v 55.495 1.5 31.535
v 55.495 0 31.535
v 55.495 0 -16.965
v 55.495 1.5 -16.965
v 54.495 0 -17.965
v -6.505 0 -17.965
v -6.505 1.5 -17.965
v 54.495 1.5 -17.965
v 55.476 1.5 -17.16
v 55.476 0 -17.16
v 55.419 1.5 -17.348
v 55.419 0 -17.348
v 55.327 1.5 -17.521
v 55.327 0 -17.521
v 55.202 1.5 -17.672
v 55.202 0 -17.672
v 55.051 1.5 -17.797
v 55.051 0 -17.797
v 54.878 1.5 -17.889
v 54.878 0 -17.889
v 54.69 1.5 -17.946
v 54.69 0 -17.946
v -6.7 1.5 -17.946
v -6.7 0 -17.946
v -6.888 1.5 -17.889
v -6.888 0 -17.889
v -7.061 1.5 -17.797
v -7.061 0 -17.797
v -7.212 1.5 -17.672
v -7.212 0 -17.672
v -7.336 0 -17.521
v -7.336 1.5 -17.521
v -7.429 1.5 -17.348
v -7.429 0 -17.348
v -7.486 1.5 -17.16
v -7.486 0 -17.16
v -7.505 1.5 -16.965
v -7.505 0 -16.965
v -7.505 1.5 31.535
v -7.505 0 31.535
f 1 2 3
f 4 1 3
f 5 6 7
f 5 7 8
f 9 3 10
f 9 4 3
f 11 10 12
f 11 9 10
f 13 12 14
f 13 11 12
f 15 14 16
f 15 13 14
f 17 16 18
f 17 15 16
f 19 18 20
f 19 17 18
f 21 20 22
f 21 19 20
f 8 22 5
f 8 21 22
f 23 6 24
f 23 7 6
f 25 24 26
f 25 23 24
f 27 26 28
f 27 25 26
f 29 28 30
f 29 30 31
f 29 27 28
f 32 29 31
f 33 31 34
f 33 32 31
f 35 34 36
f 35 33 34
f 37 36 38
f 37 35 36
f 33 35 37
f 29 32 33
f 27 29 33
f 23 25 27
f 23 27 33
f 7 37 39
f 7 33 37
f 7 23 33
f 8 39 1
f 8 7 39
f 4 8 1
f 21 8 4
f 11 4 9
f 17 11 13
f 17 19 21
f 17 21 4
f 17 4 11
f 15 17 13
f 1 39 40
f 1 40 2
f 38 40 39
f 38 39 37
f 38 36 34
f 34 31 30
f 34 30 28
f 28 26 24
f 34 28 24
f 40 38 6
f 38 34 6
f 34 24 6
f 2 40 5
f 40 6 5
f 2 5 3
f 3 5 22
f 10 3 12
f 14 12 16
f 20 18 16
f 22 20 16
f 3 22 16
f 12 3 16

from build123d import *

# Parameters (mm, degrees)
SKETCH1_W           = 63
SKETCH1_H           = 57
BOSS_EXTRUDE1_DEPTH = 1.5
FILLET1_R           = 1
FILLET2_R           = 1
FILLET3_R           = 1
SKETCH3_W           = 63.057677914
SKETCH3_H           = 7.5
CUT_EXTRUDE2_DEPTH  = 10


with BuildPart() as part:
    # Sketch1 → Boss-Extrude1 (new body)
    with BuildSketch(Plane(origin=(0, 0, 0), x_dir=(1, 0, 0), z_dir=(0, 1, 0))):
        with Locations((23.995049505, -10.534653465)):
            Rectangle(SKETCH1_W, SKETCH1_H)
    extrude(amount=BOSS_EXTRUDE1_DEPTH)

    # Fillet1
    fillet1_edges = [part.edges().sort_by_distance(p)[0] for p in [
        (55.495049505, 0.75, 39.034653465),
    ]]
    fillet(fillet1_edges, radius=FILLET1_R)

    # Fillet2
    fillet2_edges = [part.edges().sort_by_distance(p)[0] for p in [
        (55.495049505, 0.75, -17.965346535),
    ]]
    fillet(fillet2_edges, radius=FILLET2_R)

    # Fillet3
    fillet3_edges = [part.edges().sort_by_distance(p)[0] for p in [
        (-7.504950495, 0.75, -17.965346535),
        (-7.504950495, 0.75, 39.034653465),
    ]]
    fillet(fillet3_edges, radius=FILLET3_R)

    # Sketch3 → Cut-Extrude2 (cut)
    with BuildSketch(Plane(origin=(0, 1.5, 0), x_dir=(1, 0, 0), z_dir=(0, 1, 0))):
        with Locations((24.023888462, -35.284653465)):
            Rectangle(SKETCH3_W, SKETCH3_H)
    extrude(amount=-CUT_EXTRUDE2_DEPTH, mode=Mode.SUBTRACT)


solid = part.part
